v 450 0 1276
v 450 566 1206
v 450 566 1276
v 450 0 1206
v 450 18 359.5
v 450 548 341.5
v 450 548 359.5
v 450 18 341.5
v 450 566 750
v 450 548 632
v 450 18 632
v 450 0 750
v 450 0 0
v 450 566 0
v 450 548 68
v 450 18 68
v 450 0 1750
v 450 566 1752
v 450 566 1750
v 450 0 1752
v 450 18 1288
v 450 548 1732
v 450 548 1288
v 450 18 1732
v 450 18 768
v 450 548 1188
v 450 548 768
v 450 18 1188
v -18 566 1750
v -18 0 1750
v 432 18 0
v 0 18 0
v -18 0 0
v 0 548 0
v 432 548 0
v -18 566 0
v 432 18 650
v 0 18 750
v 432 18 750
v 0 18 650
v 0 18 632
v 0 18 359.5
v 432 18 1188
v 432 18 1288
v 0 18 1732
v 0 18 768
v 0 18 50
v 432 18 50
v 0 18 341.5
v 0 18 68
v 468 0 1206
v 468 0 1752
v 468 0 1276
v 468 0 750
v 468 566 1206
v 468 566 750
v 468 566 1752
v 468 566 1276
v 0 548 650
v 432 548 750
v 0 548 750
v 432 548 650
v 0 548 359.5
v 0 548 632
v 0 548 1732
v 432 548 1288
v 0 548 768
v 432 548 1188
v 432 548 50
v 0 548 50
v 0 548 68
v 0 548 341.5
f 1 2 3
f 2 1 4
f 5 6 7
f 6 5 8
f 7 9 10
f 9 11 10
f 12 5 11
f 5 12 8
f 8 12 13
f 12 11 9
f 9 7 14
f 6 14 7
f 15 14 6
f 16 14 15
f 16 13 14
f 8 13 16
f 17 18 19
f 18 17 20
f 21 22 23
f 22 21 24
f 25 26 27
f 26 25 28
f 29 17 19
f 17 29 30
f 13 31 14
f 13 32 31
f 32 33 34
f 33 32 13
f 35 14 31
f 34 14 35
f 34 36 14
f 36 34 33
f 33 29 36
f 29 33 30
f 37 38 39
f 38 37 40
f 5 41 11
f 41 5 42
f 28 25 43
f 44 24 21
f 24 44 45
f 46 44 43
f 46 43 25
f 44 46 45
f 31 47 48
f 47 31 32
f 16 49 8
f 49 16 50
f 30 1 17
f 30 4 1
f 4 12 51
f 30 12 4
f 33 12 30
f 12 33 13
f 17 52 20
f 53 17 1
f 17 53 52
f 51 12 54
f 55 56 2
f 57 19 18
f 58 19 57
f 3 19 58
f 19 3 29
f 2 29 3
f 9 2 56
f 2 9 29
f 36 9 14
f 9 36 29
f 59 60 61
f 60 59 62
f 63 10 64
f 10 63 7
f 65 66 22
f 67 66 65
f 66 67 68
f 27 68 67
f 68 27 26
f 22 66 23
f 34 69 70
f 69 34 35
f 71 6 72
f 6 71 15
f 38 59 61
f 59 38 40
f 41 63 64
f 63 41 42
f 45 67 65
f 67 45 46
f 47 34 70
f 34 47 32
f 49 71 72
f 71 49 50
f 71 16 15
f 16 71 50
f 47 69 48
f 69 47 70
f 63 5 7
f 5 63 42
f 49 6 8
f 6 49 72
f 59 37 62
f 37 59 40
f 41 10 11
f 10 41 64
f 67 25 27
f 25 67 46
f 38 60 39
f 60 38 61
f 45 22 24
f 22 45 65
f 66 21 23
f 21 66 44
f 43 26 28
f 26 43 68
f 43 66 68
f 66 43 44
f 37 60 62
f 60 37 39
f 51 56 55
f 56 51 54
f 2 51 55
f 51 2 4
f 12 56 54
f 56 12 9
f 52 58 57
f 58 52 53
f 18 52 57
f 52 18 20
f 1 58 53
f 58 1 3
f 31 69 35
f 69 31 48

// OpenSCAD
module panel0(ax,ay,){
    cube([ax,18,ay]);
    echo("Panel", ax, " x ", ay);
}
module panel1(ax,ay,){
    cube([ax,ay,18]);
    echo("Panel", ax, " x ", ay);
}
module panel2(ax,ay,){
    cube([18,ax,ay]);
    echo("Panel", ax, " x ", ay);
}

translate([-18,0,0])panel0(380+70+18,1750);//pared izq
translate([-18,18+530,0])panel0(380+70+18,1750);//pared der
translate([-18,18,0])panel2(530,1750);// tapa trasera del mueble

//de abajo para arriba los estantes
translate([0,18,50])panel1(380+70,530);//estante base
//translate([0,18,50 +700/3])panel1(380+70,530);//estante
translate([0,18,50+583/2])panel1(380+70,530);//estante
translate([0,18,50+700-18-100])panel1(380+70,530);// piso electronica
translate([0,18,50+700])panel1(380+70,530);// piso impresora
//translate([0,18,50+700+18+420])panel1(380+70,530);// techo impresora
translate([0,18,1750-18])panel1(380+70,530);// techo estructura
//fin de los estantes


translate([380+70-18,18,50+700+18+420])panel2(530,100);// parante delantero impresora impresora
translate([380+70-18,18,650])panel2(530,100);// parante delantero bajo la impresora
translate([380+70,0,50+700])panel2(530+18*2,420+18*2);// puerta impresora

//translate([380+70,0,50])panel2(530+18*2,450+100+18*3);// puerta impresora

translate([380+70,0,50+700+80+18*2+410])panel2(530+18*2,420+18*2+20);// puerta filamentos


translate([380+70-18,18,0])panel2(530,50);// tapa delantera abajo
